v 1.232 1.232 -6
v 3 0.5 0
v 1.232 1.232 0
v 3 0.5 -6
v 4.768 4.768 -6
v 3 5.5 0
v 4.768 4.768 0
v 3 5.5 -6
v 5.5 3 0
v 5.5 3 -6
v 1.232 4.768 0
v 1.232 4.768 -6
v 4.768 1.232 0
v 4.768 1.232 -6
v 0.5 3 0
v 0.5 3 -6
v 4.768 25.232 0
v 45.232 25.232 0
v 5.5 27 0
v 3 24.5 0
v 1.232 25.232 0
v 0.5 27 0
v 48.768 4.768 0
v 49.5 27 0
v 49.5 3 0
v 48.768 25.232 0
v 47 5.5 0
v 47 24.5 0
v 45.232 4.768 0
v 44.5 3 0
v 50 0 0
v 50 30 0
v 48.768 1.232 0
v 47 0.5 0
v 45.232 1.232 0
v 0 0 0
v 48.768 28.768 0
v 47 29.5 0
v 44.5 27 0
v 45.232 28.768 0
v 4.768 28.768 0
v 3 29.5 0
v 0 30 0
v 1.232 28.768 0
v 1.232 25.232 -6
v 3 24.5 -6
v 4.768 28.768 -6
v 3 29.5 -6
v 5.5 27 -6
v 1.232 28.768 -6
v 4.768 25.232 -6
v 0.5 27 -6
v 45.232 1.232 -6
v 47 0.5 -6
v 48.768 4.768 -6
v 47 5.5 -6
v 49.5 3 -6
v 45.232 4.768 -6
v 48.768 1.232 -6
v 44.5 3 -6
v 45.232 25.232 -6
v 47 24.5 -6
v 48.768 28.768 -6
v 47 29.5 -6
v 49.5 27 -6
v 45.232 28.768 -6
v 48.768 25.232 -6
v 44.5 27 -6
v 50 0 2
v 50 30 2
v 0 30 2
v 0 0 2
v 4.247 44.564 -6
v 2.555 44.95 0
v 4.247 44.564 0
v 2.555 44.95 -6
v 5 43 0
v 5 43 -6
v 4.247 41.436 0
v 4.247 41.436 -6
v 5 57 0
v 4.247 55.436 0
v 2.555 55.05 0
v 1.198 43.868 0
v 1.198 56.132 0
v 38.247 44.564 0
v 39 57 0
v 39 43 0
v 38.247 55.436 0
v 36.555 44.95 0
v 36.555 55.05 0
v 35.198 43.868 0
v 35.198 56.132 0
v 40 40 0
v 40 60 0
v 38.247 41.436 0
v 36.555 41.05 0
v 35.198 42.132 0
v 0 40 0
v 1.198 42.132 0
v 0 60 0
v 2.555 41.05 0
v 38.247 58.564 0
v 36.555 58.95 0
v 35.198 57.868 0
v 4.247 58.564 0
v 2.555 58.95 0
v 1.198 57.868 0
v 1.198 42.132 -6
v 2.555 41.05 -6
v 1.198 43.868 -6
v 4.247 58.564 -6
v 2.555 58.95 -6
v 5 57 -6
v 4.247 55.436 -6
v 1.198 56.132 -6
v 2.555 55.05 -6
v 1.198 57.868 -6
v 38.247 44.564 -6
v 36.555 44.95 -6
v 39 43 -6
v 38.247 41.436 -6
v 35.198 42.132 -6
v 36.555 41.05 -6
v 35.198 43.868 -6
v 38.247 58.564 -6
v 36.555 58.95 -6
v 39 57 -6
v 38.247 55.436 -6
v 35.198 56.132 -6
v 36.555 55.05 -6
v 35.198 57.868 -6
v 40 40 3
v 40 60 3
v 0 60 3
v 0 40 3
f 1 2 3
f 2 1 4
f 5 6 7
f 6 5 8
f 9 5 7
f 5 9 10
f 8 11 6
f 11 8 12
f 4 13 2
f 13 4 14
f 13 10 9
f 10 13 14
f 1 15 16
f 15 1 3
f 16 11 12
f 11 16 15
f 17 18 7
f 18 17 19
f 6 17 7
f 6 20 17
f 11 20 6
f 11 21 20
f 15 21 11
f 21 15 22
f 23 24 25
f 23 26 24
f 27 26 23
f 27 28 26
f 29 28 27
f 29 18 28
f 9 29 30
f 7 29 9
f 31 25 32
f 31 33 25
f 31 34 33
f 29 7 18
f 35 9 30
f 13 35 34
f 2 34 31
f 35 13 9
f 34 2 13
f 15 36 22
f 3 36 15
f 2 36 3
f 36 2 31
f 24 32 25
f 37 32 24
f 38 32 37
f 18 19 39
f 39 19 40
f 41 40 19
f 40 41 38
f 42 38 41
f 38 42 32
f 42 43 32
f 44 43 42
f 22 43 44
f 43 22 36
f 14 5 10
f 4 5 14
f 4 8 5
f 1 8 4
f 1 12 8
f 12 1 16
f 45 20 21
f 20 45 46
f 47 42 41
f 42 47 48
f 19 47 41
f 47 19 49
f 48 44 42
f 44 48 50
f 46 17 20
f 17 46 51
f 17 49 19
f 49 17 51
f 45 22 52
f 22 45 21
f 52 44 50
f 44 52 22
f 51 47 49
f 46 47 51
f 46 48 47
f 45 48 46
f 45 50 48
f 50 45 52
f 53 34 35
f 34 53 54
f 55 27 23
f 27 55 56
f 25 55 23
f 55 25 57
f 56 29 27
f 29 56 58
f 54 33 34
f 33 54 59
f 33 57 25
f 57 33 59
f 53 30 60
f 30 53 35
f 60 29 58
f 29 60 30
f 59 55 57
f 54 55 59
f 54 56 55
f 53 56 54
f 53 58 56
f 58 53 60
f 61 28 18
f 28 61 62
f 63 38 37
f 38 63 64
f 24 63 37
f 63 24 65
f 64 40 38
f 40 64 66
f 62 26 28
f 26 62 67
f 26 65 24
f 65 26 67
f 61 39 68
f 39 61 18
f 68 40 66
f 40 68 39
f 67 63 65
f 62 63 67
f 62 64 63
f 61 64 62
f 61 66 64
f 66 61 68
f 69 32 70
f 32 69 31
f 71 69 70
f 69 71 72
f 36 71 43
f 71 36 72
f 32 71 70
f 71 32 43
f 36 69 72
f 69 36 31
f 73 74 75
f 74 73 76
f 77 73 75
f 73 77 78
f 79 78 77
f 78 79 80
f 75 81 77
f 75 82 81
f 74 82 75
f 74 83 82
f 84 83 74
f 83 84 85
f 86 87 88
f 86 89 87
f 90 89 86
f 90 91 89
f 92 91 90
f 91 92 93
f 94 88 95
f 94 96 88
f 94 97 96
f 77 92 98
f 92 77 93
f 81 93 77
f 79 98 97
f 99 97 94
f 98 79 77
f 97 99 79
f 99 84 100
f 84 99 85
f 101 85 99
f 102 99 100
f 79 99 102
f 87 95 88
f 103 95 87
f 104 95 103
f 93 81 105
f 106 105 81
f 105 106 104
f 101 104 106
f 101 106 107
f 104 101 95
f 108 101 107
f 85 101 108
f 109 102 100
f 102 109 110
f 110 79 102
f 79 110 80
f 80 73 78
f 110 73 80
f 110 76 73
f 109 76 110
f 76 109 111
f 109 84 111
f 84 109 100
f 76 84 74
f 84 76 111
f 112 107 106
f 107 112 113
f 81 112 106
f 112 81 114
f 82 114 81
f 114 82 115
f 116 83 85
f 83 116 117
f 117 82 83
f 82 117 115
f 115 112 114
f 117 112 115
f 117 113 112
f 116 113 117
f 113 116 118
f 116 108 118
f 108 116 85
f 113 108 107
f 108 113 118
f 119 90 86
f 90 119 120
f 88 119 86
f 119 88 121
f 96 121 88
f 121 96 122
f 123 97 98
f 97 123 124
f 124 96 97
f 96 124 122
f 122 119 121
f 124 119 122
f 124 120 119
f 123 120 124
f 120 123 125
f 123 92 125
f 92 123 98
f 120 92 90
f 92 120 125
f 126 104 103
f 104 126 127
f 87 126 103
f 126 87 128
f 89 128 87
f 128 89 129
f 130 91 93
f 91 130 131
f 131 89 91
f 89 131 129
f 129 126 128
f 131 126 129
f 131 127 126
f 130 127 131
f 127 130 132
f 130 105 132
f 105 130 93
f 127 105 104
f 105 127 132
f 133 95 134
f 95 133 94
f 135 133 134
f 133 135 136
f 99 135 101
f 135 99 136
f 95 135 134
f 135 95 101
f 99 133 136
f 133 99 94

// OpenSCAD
// Purpose: modules with parameters and children() – feet at the corners of a plate.
module corners(w, d) {
    for (x = [0, w], y = [0, d]) translate([x, y, 0]) children();
}
module plate(w = 40, d = 30, t = 2) {
    cube([w, d, t]);
    translate([0, 0, -6]) corners(w - 6, d - 6) translate([3, 3, 0]) children(0);
}
module foot(r = 2) cylinder(h = 6, r = r);
plate(w = 50) foot(r = 2.5);
translate([0, 40, 0]) plate(d = 20, t = 3) foot();
